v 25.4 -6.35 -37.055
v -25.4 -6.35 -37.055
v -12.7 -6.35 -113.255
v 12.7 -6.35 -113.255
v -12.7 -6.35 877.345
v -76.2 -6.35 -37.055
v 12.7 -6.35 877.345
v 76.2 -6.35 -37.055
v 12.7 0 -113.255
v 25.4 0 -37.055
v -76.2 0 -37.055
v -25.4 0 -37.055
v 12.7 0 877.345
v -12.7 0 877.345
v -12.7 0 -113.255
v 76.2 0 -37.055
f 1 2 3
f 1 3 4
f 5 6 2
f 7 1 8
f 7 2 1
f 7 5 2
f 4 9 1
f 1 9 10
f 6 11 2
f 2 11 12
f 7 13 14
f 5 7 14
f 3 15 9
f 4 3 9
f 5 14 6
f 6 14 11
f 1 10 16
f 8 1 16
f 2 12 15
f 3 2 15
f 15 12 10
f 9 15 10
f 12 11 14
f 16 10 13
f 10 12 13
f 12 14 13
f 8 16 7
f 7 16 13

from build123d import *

# Parameters (mm, degrees)
F1_DEPTH = 6.35


with BuildPart() as f1:
    # F0 (on Front) → F1 (new body)
    with BuildSketch(Plane.XZ):
        Polygon((0, -37.055038), (0, 877.344962), (-12.7, 877.344962), (-76.2, -37.055038), (-25.4, -37.055038), align=None)
        Polygon((12.7, 877.344962), (0, 877.344962), (0, -37.055038), (25.4, -37.055038), (76.2, -37.055038), align=None)
        Polygon((0, -113.255038), (0, -37.055038), (-25.4, -37.055038), (-12.7, -113.255038), align=None)
        Polygon((25.4, -37.055038), (0, -37.055038), (0, -113.255038), (12.7, -113.255038), align=None)
    extrude(amount=F1_DEPTH)


solid = f1.part
